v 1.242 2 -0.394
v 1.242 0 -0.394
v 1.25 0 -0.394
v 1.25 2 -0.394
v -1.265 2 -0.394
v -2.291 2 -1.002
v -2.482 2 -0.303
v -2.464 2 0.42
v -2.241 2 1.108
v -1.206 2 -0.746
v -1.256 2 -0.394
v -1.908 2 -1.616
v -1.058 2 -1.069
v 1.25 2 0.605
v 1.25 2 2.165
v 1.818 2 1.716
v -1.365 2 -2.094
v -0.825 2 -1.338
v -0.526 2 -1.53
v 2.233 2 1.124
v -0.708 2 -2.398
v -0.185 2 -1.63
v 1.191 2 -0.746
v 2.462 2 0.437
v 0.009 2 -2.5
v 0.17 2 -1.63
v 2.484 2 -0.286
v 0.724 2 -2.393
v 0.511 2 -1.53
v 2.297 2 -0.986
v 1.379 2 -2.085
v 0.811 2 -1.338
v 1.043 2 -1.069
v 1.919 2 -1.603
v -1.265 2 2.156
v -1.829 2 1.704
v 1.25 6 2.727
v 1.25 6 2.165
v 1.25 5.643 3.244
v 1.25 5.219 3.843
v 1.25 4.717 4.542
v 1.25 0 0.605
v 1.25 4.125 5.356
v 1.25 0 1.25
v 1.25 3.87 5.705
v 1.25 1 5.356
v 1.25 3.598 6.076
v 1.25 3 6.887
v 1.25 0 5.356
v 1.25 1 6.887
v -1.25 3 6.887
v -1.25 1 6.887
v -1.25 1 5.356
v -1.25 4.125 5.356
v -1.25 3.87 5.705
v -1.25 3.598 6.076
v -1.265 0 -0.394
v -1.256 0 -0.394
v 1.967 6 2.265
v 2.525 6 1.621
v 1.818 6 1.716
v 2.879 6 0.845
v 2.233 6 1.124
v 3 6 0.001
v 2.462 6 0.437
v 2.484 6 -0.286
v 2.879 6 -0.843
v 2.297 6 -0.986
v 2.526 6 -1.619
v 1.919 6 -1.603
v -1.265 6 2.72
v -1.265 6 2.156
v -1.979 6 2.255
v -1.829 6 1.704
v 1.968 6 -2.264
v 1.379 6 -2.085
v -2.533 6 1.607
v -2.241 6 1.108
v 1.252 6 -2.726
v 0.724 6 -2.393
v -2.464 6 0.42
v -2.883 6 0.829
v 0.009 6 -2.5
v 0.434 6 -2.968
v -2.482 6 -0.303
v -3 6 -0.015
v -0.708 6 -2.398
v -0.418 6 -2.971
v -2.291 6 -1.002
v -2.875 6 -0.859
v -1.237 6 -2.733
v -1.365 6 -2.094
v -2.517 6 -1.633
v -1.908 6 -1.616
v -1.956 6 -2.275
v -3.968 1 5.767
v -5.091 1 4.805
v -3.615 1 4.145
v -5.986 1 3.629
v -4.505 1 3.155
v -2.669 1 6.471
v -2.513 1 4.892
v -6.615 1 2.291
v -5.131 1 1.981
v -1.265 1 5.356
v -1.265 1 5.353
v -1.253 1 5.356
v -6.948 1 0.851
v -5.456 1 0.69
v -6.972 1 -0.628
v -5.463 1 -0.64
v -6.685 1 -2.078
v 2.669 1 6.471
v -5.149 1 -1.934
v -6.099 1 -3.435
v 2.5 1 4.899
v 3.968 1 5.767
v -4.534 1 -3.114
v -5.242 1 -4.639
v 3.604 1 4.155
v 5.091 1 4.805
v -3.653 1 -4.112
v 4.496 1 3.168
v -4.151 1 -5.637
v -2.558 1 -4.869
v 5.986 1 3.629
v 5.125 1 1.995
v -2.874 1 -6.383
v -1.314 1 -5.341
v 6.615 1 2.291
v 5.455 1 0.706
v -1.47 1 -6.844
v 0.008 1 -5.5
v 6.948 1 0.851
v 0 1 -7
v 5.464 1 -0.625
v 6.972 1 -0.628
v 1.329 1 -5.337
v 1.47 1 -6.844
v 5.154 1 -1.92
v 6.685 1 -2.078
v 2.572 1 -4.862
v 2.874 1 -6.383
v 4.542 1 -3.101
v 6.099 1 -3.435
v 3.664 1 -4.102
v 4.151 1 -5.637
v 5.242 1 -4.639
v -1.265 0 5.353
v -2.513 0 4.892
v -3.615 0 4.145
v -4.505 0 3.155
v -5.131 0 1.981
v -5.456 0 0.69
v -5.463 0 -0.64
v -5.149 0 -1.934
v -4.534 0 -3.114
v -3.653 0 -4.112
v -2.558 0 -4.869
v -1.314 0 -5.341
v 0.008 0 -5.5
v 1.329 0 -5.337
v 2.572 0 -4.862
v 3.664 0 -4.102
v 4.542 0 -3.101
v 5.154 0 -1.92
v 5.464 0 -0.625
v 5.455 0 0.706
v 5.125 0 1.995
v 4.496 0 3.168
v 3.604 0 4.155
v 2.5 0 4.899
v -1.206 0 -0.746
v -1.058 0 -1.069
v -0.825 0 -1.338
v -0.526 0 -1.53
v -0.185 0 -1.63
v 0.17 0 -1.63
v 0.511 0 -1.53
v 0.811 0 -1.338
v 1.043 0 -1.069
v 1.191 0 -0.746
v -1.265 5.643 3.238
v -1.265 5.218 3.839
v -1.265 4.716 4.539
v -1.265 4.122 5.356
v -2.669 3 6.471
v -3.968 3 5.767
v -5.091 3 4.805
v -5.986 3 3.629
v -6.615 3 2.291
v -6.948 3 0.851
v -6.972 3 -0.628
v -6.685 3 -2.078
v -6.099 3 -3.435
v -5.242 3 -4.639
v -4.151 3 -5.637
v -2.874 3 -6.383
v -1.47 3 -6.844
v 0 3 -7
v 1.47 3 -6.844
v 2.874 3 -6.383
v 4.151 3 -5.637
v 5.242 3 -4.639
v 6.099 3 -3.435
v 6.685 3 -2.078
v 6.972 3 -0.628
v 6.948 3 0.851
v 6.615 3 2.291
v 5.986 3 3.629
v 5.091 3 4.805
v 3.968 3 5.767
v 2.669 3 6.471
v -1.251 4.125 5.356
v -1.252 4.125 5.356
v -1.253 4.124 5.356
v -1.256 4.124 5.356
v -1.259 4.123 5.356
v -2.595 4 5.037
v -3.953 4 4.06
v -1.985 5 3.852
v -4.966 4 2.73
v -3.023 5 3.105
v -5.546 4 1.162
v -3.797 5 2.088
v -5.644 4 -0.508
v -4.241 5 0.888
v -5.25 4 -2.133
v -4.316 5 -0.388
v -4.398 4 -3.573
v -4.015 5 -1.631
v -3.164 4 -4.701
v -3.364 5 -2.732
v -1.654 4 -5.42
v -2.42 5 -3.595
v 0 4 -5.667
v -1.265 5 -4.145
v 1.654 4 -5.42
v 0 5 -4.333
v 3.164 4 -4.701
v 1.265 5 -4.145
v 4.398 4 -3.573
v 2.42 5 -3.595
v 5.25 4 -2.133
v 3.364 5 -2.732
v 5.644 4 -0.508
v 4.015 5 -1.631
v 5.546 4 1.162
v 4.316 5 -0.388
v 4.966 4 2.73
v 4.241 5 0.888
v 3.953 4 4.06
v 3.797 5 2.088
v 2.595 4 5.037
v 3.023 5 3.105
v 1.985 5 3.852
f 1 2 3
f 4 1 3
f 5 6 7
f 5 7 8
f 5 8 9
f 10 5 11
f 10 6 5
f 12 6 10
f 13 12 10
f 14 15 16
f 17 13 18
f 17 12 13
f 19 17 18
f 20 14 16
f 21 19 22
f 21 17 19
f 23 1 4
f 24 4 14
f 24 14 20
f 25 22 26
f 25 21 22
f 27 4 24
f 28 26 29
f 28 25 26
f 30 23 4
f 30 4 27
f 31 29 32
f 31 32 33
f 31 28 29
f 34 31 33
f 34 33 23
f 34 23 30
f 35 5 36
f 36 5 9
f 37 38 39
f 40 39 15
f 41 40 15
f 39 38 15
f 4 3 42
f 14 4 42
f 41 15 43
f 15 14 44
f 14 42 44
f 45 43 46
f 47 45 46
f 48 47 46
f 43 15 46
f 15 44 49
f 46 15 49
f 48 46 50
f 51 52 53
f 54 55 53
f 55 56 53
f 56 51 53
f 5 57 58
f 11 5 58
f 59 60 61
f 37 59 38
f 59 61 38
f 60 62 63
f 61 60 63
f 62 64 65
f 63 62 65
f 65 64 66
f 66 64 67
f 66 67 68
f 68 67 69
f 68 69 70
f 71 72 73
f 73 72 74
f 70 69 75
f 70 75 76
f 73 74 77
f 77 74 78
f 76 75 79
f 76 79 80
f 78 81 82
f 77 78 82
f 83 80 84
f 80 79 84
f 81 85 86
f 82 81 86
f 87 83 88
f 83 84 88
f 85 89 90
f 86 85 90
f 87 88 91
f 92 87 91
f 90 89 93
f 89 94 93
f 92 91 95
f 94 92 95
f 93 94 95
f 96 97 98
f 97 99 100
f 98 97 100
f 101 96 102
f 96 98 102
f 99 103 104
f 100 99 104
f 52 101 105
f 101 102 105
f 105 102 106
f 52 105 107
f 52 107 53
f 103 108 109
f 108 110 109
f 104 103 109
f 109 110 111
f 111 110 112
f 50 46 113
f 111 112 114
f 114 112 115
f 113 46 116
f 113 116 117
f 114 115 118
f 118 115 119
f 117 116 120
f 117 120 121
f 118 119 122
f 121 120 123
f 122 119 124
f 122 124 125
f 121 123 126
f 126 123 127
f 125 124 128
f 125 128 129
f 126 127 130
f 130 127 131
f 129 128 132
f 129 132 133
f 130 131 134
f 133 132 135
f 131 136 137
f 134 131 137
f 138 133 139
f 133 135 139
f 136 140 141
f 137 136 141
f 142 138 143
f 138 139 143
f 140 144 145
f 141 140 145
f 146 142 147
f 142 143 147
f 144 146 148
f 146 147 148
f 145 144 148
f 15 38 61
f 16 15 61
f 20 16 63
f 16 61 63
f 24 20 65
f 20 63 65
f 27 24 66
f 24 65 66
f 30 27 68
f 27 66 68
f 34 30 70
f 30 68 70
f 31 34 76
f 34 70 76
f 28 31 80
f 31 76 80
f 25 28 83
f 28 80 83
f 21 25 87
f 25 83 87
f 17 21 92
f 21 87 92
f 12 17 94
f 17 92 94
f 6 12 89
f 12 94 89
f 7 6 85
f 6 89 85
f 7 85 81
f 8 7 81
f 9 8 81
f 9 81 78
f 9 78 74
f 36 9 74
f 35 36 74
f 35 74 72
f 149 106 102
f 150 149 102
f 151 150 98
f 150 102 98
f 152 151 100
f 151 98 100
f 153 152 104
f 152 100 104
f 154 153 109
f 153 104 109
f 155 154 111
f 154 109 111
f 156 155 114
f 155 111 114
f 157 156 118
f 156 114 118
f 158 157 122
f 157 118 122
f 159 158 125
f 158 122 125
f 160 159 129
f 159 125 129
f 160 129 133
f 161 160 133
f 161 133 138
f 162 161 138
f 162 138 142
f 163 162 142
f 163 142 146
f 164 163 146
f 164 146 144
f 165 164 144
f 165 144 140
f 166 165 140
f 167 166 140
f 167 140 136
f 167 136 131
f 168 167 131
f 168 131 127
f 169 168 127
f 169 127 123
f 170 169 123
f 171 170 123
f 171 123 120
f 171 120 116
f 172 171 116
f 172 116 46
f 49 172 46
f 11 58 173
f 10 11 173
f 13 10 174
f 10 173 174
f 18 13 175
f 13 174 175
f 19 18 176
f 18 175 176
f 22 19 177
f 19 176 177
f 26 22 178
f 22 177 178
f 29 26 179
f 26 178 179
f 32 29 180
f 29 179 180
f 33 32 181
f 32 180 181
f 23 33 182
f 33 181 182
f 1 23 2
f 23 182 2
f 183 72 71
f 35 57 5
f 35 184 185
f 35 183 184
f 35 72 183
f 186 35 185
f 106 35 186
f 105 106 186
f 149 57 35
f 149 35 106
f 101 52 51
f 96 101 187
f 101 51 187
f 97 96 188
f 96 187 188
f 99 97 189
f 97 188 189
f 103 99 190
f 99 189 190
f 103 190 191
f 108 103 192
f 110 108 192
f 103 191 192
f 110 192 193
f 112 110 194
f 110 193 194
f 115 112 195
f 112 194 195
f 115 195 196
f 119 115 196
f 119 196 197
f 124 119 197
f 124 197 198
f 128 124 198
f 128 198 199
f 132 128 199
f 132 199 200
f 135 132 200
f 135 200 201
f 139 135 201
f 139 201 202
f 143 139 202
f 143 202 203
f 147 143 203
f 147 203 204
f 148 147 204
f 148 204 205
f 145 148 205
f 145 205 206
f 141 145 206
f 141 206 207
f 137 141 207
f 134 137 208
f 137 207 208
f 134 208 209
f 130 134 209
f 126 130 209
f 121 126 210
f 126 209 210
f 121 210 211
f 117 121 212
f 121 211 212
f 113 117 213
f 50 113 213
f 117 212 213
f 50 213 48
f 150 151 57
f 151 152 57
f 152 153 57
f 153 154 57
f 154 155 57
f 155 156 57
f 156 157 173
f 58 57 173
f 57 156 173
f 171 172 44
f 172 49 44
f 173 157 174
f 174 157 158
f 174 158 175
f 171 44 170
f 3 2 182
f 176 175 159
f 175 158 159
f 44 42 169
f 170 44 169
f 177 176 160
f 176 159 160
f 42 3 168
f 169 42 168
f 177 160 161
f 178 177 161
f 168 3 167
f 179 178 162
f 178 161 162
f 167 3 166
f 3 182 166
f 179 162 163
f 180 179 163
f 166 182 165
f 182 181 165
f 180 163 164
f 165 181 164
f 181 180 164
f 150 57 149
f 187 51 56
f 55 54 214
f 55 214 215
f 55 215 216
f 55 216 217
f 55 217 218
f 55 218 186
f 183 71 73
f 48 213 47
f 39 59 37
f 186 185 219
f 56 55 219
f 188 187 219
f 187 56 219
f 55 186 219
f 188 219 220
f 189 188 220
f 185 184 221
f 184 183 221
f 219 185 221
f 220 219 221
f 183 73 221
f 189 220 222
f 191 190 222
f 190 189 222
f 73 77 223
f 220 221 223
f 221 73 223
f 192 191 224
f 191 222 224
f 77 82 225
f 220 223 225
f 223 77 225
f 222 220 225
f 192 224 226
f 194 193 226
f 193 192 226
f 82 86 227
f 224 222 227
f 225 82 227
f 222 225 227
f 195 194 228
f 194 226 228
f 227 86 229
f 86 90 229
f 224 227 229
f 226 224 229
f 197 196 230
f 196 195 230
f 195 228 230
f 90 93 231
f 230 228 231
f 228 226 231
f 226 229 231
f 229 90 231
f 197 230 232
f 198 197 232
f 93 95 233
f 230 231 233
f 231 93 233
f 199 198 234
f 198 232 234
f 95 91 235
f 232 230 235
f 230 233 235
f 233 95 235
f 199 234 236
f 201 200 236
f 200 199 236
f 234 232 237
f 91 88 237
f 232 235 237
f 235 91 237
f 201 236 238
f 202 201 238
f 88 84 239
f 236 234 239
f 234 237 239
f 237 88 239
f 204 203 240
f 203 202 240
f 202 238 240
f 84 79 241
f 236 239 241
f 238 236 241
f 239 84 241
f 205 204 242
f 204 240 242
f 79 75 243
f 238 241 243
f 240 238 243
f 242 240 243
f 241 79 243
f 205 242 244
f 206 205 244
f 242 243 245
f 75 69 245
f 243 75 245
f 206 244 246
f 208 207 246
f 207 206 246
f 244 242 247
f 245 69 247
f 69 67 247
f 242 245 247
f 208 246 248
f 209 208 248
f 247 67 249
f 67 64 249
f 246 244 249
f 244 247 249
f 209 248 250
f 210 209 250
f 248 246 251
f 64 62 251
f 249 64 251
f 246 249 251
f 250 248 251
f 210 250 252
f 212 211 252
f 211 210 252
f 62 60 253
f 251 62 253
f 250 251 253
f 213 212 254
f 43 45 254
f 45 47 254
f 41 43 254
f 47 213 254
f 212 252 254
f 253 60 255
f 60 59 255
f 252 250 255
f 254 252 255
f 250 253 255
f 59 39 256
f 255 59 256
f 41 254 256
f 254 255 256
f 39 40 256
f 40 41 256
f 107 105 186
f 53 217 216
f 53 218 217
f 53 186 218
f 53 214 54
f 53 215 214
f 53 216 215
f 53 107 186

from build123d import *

# Parameters (mm, degrees)
SKETCH7_R               = 2.5
CUT_EXTRUDE2_DEPTH      = 4
CUT_EXTRUDE3_DEPTH      = 4
CUT_EXTRUDE3_DEPTH_BACK = 4
SKETCH8_W               = 2.5
SKETCH8_H               = 7.259020633
FILLET1_R               = 1.5
SKETCH9_W               = 2.5
SKETCH9_H               = 5.356071321
CUT_EXTRUDE4_DEPTH      = 10
FILLET2_R               = 1.25
SKETCH10_W              = 2.503236591
SKETCH10_H              = 5.356071321
CUT_EXTRUDE5_DEPTH      = 10
SKETCH11_W              = 2.503236591
SKETCH11_H              = 6.001405943
CUT_EXTRUDE6_DEPTH      = 10
FILLET4_R               = 1.25
SKETCH12_W              = 2.514787158
SKETCH12_H              = 5.75
CUT_EXTRUDE9_DEPTH      = 10
SKETCH14_R              = 1.249039751
CUT_EXTRUDE10_DEPTH     = 10


# Some blends are built 0.0001 mm under size
with BuildPart() as part:
    # Sketch5 → Revolve3 (revolve)
    with BuildSketch(Plane.XY, mode=Mode.PRIVATE) as revolve3_sk:
        Polygon((0, 0), (5.5, 0), (5.5, 1), (7, 1), (7, 3), (3, 6), (0, 6), align=None)
    revolve(revolve3_sk.sketch.rotate(Axis((0, 6, 0), (0, -1, 0)), 180), axis=Axis((0, 6, 0), (0, -1, 0)))

    # Sketch7 → Cut-Extrude2 (cut)
    with BuildSketch(Plane(origin=(0, 6, 0), x_dir=(1, 0, 0), z_dir=(0, 1, 0))):
        with Locations(Location((0, 0, 0), (0, 0, 180))):
            Circle(SKETCH7_R)
    extrude(amount=-CUT_EXTRUDE2_DEPTH, mode=Mode.SUBTRACT)

    # Sketch8 → Cut-Extrude3 (cut, two sides: drawn at the far end of the back side and taken through both)
    with BuildSketch(Plane(origin=(0, 2, 0), x_dir=(1, 0, 0), z_dir=(0, 1, 0)).offset(-CUT_EXTRUDE3_DEPTH_BACK)):
        with Locations((0, -3.629510317)):
            Rectangle(SKETCH8_W, SKETCH8_H)
    extrude(amount=CUT_EXTRUDE3_DEPTH + CUT_EXTRUDE3_DEPTH_BACK, mode=Mode.SUBTRACT)

    # Fillet1
    # the kernel refuses this fillet: 1.5 mm, written as the material it adds along each edge
    with BuildSketch(Plane(origin=(1.25, 2, 0), x_dir=(-1, 0, 0), z_dir=(0, -1, 0)), Plane(origin=(-1.25, 0, 0), x_dir=(1, 0, 0), z_dir=(0, 1, 0))) as fillet1_piece_1:
        with BuildLine():
            CenterArc((FILLET1_R, -FILLET1_R), FILLET1_R, 90, 90)
            Line((0, -FILLET1_R), (0, 0))
            Line((0, 0), (FILLET1_R, 0))
        make_face()
    extrude(amount=2)

    # Sketch9 → Cut-Extrude4 (cut)
    with BuildSketch(Plane(origin=(0, 0, 0), x_dir=(-1, 0, 0), z_dir=(0, -1, 0))):
        with Locations((0, -2.67803566)):
            Rectangle(SKETCH9_W, SKETCH9_H)
    extrude(amount=-CUT_EXTRUDE4_DEPTH, mode=Mode.SUBTRACT)

    # Fillet2
    fillet2_edges = [part.edges().sort_by_distance(p)[0] for p in [
        (-1.25, 1, 0),
        (1.25, 1, 0),
    ]]
    fillet(fillet2_edges, radius=FILLET2_R - 0.0001)  # a hair under: the kernel refuses the full size

    # Sketch10 → Cut-Extrude5 (cut)
    with BuildSketch(Plane.XZ):
        with Locations((-0.001618296, 2.67803566)):
            Rectangle(SKETCH10_W, SKETCH10_H)
    extrude(amount=-CUT_EXTRUDE5_DEPTH, mode=Mode.SUBTRACT)

    # Sketch11 → Cut-Extrude6 (cut)
    with BuildSketch(Plane(origin=(0, 0, 0), x_dir=(-1, 0, 0), z_dir=(0, -1, 0))):
        with Locations((0.001618296, -2.355368349)):
            Rectangle(SKETCH11_W, SKETCH11_H)
    extrude(amount=-CUT_EXTRUDE6_DEPTH, mode=Mode.SUBTRACT)

    # Fillet4
    fillet4_edges = [part.edges().sort_by_distance(p)[0] for p in [
        (1.25, 1, -0.645334622),
        (-1.253236591, 1, -0.645334622),
    ]]
    fillet(fillet4_edges, radius=FILLET4_R)

    # Sketch12 → Cut-Extrude9 (cut)
    with BuildSketch(Plane.XZ):
        with Locations((-0.007393579, 2.481071321)):
            Rectangle(SKETCH12_W, SKETCH12_H)
    extrude(amount=-CUT_EXTRUDE9_DEPTH, mode=Mode.SUBTRACT)

    # Sketch14 → Cut-Extrude10 (cut)
    with BuildSketch(Plane(origin=(0, 0, 0), x_dir=(-1, 0, 0), z_dir=(0, -1, 0))):
        with Locations((0.007393579, 0.393928679)):
            Circle(SKETCH14_R)
    extrude(amount=-CUT_EXTRUDE10_DEPTH, mode=Mode.SUBTRACT)


solid = part.part
